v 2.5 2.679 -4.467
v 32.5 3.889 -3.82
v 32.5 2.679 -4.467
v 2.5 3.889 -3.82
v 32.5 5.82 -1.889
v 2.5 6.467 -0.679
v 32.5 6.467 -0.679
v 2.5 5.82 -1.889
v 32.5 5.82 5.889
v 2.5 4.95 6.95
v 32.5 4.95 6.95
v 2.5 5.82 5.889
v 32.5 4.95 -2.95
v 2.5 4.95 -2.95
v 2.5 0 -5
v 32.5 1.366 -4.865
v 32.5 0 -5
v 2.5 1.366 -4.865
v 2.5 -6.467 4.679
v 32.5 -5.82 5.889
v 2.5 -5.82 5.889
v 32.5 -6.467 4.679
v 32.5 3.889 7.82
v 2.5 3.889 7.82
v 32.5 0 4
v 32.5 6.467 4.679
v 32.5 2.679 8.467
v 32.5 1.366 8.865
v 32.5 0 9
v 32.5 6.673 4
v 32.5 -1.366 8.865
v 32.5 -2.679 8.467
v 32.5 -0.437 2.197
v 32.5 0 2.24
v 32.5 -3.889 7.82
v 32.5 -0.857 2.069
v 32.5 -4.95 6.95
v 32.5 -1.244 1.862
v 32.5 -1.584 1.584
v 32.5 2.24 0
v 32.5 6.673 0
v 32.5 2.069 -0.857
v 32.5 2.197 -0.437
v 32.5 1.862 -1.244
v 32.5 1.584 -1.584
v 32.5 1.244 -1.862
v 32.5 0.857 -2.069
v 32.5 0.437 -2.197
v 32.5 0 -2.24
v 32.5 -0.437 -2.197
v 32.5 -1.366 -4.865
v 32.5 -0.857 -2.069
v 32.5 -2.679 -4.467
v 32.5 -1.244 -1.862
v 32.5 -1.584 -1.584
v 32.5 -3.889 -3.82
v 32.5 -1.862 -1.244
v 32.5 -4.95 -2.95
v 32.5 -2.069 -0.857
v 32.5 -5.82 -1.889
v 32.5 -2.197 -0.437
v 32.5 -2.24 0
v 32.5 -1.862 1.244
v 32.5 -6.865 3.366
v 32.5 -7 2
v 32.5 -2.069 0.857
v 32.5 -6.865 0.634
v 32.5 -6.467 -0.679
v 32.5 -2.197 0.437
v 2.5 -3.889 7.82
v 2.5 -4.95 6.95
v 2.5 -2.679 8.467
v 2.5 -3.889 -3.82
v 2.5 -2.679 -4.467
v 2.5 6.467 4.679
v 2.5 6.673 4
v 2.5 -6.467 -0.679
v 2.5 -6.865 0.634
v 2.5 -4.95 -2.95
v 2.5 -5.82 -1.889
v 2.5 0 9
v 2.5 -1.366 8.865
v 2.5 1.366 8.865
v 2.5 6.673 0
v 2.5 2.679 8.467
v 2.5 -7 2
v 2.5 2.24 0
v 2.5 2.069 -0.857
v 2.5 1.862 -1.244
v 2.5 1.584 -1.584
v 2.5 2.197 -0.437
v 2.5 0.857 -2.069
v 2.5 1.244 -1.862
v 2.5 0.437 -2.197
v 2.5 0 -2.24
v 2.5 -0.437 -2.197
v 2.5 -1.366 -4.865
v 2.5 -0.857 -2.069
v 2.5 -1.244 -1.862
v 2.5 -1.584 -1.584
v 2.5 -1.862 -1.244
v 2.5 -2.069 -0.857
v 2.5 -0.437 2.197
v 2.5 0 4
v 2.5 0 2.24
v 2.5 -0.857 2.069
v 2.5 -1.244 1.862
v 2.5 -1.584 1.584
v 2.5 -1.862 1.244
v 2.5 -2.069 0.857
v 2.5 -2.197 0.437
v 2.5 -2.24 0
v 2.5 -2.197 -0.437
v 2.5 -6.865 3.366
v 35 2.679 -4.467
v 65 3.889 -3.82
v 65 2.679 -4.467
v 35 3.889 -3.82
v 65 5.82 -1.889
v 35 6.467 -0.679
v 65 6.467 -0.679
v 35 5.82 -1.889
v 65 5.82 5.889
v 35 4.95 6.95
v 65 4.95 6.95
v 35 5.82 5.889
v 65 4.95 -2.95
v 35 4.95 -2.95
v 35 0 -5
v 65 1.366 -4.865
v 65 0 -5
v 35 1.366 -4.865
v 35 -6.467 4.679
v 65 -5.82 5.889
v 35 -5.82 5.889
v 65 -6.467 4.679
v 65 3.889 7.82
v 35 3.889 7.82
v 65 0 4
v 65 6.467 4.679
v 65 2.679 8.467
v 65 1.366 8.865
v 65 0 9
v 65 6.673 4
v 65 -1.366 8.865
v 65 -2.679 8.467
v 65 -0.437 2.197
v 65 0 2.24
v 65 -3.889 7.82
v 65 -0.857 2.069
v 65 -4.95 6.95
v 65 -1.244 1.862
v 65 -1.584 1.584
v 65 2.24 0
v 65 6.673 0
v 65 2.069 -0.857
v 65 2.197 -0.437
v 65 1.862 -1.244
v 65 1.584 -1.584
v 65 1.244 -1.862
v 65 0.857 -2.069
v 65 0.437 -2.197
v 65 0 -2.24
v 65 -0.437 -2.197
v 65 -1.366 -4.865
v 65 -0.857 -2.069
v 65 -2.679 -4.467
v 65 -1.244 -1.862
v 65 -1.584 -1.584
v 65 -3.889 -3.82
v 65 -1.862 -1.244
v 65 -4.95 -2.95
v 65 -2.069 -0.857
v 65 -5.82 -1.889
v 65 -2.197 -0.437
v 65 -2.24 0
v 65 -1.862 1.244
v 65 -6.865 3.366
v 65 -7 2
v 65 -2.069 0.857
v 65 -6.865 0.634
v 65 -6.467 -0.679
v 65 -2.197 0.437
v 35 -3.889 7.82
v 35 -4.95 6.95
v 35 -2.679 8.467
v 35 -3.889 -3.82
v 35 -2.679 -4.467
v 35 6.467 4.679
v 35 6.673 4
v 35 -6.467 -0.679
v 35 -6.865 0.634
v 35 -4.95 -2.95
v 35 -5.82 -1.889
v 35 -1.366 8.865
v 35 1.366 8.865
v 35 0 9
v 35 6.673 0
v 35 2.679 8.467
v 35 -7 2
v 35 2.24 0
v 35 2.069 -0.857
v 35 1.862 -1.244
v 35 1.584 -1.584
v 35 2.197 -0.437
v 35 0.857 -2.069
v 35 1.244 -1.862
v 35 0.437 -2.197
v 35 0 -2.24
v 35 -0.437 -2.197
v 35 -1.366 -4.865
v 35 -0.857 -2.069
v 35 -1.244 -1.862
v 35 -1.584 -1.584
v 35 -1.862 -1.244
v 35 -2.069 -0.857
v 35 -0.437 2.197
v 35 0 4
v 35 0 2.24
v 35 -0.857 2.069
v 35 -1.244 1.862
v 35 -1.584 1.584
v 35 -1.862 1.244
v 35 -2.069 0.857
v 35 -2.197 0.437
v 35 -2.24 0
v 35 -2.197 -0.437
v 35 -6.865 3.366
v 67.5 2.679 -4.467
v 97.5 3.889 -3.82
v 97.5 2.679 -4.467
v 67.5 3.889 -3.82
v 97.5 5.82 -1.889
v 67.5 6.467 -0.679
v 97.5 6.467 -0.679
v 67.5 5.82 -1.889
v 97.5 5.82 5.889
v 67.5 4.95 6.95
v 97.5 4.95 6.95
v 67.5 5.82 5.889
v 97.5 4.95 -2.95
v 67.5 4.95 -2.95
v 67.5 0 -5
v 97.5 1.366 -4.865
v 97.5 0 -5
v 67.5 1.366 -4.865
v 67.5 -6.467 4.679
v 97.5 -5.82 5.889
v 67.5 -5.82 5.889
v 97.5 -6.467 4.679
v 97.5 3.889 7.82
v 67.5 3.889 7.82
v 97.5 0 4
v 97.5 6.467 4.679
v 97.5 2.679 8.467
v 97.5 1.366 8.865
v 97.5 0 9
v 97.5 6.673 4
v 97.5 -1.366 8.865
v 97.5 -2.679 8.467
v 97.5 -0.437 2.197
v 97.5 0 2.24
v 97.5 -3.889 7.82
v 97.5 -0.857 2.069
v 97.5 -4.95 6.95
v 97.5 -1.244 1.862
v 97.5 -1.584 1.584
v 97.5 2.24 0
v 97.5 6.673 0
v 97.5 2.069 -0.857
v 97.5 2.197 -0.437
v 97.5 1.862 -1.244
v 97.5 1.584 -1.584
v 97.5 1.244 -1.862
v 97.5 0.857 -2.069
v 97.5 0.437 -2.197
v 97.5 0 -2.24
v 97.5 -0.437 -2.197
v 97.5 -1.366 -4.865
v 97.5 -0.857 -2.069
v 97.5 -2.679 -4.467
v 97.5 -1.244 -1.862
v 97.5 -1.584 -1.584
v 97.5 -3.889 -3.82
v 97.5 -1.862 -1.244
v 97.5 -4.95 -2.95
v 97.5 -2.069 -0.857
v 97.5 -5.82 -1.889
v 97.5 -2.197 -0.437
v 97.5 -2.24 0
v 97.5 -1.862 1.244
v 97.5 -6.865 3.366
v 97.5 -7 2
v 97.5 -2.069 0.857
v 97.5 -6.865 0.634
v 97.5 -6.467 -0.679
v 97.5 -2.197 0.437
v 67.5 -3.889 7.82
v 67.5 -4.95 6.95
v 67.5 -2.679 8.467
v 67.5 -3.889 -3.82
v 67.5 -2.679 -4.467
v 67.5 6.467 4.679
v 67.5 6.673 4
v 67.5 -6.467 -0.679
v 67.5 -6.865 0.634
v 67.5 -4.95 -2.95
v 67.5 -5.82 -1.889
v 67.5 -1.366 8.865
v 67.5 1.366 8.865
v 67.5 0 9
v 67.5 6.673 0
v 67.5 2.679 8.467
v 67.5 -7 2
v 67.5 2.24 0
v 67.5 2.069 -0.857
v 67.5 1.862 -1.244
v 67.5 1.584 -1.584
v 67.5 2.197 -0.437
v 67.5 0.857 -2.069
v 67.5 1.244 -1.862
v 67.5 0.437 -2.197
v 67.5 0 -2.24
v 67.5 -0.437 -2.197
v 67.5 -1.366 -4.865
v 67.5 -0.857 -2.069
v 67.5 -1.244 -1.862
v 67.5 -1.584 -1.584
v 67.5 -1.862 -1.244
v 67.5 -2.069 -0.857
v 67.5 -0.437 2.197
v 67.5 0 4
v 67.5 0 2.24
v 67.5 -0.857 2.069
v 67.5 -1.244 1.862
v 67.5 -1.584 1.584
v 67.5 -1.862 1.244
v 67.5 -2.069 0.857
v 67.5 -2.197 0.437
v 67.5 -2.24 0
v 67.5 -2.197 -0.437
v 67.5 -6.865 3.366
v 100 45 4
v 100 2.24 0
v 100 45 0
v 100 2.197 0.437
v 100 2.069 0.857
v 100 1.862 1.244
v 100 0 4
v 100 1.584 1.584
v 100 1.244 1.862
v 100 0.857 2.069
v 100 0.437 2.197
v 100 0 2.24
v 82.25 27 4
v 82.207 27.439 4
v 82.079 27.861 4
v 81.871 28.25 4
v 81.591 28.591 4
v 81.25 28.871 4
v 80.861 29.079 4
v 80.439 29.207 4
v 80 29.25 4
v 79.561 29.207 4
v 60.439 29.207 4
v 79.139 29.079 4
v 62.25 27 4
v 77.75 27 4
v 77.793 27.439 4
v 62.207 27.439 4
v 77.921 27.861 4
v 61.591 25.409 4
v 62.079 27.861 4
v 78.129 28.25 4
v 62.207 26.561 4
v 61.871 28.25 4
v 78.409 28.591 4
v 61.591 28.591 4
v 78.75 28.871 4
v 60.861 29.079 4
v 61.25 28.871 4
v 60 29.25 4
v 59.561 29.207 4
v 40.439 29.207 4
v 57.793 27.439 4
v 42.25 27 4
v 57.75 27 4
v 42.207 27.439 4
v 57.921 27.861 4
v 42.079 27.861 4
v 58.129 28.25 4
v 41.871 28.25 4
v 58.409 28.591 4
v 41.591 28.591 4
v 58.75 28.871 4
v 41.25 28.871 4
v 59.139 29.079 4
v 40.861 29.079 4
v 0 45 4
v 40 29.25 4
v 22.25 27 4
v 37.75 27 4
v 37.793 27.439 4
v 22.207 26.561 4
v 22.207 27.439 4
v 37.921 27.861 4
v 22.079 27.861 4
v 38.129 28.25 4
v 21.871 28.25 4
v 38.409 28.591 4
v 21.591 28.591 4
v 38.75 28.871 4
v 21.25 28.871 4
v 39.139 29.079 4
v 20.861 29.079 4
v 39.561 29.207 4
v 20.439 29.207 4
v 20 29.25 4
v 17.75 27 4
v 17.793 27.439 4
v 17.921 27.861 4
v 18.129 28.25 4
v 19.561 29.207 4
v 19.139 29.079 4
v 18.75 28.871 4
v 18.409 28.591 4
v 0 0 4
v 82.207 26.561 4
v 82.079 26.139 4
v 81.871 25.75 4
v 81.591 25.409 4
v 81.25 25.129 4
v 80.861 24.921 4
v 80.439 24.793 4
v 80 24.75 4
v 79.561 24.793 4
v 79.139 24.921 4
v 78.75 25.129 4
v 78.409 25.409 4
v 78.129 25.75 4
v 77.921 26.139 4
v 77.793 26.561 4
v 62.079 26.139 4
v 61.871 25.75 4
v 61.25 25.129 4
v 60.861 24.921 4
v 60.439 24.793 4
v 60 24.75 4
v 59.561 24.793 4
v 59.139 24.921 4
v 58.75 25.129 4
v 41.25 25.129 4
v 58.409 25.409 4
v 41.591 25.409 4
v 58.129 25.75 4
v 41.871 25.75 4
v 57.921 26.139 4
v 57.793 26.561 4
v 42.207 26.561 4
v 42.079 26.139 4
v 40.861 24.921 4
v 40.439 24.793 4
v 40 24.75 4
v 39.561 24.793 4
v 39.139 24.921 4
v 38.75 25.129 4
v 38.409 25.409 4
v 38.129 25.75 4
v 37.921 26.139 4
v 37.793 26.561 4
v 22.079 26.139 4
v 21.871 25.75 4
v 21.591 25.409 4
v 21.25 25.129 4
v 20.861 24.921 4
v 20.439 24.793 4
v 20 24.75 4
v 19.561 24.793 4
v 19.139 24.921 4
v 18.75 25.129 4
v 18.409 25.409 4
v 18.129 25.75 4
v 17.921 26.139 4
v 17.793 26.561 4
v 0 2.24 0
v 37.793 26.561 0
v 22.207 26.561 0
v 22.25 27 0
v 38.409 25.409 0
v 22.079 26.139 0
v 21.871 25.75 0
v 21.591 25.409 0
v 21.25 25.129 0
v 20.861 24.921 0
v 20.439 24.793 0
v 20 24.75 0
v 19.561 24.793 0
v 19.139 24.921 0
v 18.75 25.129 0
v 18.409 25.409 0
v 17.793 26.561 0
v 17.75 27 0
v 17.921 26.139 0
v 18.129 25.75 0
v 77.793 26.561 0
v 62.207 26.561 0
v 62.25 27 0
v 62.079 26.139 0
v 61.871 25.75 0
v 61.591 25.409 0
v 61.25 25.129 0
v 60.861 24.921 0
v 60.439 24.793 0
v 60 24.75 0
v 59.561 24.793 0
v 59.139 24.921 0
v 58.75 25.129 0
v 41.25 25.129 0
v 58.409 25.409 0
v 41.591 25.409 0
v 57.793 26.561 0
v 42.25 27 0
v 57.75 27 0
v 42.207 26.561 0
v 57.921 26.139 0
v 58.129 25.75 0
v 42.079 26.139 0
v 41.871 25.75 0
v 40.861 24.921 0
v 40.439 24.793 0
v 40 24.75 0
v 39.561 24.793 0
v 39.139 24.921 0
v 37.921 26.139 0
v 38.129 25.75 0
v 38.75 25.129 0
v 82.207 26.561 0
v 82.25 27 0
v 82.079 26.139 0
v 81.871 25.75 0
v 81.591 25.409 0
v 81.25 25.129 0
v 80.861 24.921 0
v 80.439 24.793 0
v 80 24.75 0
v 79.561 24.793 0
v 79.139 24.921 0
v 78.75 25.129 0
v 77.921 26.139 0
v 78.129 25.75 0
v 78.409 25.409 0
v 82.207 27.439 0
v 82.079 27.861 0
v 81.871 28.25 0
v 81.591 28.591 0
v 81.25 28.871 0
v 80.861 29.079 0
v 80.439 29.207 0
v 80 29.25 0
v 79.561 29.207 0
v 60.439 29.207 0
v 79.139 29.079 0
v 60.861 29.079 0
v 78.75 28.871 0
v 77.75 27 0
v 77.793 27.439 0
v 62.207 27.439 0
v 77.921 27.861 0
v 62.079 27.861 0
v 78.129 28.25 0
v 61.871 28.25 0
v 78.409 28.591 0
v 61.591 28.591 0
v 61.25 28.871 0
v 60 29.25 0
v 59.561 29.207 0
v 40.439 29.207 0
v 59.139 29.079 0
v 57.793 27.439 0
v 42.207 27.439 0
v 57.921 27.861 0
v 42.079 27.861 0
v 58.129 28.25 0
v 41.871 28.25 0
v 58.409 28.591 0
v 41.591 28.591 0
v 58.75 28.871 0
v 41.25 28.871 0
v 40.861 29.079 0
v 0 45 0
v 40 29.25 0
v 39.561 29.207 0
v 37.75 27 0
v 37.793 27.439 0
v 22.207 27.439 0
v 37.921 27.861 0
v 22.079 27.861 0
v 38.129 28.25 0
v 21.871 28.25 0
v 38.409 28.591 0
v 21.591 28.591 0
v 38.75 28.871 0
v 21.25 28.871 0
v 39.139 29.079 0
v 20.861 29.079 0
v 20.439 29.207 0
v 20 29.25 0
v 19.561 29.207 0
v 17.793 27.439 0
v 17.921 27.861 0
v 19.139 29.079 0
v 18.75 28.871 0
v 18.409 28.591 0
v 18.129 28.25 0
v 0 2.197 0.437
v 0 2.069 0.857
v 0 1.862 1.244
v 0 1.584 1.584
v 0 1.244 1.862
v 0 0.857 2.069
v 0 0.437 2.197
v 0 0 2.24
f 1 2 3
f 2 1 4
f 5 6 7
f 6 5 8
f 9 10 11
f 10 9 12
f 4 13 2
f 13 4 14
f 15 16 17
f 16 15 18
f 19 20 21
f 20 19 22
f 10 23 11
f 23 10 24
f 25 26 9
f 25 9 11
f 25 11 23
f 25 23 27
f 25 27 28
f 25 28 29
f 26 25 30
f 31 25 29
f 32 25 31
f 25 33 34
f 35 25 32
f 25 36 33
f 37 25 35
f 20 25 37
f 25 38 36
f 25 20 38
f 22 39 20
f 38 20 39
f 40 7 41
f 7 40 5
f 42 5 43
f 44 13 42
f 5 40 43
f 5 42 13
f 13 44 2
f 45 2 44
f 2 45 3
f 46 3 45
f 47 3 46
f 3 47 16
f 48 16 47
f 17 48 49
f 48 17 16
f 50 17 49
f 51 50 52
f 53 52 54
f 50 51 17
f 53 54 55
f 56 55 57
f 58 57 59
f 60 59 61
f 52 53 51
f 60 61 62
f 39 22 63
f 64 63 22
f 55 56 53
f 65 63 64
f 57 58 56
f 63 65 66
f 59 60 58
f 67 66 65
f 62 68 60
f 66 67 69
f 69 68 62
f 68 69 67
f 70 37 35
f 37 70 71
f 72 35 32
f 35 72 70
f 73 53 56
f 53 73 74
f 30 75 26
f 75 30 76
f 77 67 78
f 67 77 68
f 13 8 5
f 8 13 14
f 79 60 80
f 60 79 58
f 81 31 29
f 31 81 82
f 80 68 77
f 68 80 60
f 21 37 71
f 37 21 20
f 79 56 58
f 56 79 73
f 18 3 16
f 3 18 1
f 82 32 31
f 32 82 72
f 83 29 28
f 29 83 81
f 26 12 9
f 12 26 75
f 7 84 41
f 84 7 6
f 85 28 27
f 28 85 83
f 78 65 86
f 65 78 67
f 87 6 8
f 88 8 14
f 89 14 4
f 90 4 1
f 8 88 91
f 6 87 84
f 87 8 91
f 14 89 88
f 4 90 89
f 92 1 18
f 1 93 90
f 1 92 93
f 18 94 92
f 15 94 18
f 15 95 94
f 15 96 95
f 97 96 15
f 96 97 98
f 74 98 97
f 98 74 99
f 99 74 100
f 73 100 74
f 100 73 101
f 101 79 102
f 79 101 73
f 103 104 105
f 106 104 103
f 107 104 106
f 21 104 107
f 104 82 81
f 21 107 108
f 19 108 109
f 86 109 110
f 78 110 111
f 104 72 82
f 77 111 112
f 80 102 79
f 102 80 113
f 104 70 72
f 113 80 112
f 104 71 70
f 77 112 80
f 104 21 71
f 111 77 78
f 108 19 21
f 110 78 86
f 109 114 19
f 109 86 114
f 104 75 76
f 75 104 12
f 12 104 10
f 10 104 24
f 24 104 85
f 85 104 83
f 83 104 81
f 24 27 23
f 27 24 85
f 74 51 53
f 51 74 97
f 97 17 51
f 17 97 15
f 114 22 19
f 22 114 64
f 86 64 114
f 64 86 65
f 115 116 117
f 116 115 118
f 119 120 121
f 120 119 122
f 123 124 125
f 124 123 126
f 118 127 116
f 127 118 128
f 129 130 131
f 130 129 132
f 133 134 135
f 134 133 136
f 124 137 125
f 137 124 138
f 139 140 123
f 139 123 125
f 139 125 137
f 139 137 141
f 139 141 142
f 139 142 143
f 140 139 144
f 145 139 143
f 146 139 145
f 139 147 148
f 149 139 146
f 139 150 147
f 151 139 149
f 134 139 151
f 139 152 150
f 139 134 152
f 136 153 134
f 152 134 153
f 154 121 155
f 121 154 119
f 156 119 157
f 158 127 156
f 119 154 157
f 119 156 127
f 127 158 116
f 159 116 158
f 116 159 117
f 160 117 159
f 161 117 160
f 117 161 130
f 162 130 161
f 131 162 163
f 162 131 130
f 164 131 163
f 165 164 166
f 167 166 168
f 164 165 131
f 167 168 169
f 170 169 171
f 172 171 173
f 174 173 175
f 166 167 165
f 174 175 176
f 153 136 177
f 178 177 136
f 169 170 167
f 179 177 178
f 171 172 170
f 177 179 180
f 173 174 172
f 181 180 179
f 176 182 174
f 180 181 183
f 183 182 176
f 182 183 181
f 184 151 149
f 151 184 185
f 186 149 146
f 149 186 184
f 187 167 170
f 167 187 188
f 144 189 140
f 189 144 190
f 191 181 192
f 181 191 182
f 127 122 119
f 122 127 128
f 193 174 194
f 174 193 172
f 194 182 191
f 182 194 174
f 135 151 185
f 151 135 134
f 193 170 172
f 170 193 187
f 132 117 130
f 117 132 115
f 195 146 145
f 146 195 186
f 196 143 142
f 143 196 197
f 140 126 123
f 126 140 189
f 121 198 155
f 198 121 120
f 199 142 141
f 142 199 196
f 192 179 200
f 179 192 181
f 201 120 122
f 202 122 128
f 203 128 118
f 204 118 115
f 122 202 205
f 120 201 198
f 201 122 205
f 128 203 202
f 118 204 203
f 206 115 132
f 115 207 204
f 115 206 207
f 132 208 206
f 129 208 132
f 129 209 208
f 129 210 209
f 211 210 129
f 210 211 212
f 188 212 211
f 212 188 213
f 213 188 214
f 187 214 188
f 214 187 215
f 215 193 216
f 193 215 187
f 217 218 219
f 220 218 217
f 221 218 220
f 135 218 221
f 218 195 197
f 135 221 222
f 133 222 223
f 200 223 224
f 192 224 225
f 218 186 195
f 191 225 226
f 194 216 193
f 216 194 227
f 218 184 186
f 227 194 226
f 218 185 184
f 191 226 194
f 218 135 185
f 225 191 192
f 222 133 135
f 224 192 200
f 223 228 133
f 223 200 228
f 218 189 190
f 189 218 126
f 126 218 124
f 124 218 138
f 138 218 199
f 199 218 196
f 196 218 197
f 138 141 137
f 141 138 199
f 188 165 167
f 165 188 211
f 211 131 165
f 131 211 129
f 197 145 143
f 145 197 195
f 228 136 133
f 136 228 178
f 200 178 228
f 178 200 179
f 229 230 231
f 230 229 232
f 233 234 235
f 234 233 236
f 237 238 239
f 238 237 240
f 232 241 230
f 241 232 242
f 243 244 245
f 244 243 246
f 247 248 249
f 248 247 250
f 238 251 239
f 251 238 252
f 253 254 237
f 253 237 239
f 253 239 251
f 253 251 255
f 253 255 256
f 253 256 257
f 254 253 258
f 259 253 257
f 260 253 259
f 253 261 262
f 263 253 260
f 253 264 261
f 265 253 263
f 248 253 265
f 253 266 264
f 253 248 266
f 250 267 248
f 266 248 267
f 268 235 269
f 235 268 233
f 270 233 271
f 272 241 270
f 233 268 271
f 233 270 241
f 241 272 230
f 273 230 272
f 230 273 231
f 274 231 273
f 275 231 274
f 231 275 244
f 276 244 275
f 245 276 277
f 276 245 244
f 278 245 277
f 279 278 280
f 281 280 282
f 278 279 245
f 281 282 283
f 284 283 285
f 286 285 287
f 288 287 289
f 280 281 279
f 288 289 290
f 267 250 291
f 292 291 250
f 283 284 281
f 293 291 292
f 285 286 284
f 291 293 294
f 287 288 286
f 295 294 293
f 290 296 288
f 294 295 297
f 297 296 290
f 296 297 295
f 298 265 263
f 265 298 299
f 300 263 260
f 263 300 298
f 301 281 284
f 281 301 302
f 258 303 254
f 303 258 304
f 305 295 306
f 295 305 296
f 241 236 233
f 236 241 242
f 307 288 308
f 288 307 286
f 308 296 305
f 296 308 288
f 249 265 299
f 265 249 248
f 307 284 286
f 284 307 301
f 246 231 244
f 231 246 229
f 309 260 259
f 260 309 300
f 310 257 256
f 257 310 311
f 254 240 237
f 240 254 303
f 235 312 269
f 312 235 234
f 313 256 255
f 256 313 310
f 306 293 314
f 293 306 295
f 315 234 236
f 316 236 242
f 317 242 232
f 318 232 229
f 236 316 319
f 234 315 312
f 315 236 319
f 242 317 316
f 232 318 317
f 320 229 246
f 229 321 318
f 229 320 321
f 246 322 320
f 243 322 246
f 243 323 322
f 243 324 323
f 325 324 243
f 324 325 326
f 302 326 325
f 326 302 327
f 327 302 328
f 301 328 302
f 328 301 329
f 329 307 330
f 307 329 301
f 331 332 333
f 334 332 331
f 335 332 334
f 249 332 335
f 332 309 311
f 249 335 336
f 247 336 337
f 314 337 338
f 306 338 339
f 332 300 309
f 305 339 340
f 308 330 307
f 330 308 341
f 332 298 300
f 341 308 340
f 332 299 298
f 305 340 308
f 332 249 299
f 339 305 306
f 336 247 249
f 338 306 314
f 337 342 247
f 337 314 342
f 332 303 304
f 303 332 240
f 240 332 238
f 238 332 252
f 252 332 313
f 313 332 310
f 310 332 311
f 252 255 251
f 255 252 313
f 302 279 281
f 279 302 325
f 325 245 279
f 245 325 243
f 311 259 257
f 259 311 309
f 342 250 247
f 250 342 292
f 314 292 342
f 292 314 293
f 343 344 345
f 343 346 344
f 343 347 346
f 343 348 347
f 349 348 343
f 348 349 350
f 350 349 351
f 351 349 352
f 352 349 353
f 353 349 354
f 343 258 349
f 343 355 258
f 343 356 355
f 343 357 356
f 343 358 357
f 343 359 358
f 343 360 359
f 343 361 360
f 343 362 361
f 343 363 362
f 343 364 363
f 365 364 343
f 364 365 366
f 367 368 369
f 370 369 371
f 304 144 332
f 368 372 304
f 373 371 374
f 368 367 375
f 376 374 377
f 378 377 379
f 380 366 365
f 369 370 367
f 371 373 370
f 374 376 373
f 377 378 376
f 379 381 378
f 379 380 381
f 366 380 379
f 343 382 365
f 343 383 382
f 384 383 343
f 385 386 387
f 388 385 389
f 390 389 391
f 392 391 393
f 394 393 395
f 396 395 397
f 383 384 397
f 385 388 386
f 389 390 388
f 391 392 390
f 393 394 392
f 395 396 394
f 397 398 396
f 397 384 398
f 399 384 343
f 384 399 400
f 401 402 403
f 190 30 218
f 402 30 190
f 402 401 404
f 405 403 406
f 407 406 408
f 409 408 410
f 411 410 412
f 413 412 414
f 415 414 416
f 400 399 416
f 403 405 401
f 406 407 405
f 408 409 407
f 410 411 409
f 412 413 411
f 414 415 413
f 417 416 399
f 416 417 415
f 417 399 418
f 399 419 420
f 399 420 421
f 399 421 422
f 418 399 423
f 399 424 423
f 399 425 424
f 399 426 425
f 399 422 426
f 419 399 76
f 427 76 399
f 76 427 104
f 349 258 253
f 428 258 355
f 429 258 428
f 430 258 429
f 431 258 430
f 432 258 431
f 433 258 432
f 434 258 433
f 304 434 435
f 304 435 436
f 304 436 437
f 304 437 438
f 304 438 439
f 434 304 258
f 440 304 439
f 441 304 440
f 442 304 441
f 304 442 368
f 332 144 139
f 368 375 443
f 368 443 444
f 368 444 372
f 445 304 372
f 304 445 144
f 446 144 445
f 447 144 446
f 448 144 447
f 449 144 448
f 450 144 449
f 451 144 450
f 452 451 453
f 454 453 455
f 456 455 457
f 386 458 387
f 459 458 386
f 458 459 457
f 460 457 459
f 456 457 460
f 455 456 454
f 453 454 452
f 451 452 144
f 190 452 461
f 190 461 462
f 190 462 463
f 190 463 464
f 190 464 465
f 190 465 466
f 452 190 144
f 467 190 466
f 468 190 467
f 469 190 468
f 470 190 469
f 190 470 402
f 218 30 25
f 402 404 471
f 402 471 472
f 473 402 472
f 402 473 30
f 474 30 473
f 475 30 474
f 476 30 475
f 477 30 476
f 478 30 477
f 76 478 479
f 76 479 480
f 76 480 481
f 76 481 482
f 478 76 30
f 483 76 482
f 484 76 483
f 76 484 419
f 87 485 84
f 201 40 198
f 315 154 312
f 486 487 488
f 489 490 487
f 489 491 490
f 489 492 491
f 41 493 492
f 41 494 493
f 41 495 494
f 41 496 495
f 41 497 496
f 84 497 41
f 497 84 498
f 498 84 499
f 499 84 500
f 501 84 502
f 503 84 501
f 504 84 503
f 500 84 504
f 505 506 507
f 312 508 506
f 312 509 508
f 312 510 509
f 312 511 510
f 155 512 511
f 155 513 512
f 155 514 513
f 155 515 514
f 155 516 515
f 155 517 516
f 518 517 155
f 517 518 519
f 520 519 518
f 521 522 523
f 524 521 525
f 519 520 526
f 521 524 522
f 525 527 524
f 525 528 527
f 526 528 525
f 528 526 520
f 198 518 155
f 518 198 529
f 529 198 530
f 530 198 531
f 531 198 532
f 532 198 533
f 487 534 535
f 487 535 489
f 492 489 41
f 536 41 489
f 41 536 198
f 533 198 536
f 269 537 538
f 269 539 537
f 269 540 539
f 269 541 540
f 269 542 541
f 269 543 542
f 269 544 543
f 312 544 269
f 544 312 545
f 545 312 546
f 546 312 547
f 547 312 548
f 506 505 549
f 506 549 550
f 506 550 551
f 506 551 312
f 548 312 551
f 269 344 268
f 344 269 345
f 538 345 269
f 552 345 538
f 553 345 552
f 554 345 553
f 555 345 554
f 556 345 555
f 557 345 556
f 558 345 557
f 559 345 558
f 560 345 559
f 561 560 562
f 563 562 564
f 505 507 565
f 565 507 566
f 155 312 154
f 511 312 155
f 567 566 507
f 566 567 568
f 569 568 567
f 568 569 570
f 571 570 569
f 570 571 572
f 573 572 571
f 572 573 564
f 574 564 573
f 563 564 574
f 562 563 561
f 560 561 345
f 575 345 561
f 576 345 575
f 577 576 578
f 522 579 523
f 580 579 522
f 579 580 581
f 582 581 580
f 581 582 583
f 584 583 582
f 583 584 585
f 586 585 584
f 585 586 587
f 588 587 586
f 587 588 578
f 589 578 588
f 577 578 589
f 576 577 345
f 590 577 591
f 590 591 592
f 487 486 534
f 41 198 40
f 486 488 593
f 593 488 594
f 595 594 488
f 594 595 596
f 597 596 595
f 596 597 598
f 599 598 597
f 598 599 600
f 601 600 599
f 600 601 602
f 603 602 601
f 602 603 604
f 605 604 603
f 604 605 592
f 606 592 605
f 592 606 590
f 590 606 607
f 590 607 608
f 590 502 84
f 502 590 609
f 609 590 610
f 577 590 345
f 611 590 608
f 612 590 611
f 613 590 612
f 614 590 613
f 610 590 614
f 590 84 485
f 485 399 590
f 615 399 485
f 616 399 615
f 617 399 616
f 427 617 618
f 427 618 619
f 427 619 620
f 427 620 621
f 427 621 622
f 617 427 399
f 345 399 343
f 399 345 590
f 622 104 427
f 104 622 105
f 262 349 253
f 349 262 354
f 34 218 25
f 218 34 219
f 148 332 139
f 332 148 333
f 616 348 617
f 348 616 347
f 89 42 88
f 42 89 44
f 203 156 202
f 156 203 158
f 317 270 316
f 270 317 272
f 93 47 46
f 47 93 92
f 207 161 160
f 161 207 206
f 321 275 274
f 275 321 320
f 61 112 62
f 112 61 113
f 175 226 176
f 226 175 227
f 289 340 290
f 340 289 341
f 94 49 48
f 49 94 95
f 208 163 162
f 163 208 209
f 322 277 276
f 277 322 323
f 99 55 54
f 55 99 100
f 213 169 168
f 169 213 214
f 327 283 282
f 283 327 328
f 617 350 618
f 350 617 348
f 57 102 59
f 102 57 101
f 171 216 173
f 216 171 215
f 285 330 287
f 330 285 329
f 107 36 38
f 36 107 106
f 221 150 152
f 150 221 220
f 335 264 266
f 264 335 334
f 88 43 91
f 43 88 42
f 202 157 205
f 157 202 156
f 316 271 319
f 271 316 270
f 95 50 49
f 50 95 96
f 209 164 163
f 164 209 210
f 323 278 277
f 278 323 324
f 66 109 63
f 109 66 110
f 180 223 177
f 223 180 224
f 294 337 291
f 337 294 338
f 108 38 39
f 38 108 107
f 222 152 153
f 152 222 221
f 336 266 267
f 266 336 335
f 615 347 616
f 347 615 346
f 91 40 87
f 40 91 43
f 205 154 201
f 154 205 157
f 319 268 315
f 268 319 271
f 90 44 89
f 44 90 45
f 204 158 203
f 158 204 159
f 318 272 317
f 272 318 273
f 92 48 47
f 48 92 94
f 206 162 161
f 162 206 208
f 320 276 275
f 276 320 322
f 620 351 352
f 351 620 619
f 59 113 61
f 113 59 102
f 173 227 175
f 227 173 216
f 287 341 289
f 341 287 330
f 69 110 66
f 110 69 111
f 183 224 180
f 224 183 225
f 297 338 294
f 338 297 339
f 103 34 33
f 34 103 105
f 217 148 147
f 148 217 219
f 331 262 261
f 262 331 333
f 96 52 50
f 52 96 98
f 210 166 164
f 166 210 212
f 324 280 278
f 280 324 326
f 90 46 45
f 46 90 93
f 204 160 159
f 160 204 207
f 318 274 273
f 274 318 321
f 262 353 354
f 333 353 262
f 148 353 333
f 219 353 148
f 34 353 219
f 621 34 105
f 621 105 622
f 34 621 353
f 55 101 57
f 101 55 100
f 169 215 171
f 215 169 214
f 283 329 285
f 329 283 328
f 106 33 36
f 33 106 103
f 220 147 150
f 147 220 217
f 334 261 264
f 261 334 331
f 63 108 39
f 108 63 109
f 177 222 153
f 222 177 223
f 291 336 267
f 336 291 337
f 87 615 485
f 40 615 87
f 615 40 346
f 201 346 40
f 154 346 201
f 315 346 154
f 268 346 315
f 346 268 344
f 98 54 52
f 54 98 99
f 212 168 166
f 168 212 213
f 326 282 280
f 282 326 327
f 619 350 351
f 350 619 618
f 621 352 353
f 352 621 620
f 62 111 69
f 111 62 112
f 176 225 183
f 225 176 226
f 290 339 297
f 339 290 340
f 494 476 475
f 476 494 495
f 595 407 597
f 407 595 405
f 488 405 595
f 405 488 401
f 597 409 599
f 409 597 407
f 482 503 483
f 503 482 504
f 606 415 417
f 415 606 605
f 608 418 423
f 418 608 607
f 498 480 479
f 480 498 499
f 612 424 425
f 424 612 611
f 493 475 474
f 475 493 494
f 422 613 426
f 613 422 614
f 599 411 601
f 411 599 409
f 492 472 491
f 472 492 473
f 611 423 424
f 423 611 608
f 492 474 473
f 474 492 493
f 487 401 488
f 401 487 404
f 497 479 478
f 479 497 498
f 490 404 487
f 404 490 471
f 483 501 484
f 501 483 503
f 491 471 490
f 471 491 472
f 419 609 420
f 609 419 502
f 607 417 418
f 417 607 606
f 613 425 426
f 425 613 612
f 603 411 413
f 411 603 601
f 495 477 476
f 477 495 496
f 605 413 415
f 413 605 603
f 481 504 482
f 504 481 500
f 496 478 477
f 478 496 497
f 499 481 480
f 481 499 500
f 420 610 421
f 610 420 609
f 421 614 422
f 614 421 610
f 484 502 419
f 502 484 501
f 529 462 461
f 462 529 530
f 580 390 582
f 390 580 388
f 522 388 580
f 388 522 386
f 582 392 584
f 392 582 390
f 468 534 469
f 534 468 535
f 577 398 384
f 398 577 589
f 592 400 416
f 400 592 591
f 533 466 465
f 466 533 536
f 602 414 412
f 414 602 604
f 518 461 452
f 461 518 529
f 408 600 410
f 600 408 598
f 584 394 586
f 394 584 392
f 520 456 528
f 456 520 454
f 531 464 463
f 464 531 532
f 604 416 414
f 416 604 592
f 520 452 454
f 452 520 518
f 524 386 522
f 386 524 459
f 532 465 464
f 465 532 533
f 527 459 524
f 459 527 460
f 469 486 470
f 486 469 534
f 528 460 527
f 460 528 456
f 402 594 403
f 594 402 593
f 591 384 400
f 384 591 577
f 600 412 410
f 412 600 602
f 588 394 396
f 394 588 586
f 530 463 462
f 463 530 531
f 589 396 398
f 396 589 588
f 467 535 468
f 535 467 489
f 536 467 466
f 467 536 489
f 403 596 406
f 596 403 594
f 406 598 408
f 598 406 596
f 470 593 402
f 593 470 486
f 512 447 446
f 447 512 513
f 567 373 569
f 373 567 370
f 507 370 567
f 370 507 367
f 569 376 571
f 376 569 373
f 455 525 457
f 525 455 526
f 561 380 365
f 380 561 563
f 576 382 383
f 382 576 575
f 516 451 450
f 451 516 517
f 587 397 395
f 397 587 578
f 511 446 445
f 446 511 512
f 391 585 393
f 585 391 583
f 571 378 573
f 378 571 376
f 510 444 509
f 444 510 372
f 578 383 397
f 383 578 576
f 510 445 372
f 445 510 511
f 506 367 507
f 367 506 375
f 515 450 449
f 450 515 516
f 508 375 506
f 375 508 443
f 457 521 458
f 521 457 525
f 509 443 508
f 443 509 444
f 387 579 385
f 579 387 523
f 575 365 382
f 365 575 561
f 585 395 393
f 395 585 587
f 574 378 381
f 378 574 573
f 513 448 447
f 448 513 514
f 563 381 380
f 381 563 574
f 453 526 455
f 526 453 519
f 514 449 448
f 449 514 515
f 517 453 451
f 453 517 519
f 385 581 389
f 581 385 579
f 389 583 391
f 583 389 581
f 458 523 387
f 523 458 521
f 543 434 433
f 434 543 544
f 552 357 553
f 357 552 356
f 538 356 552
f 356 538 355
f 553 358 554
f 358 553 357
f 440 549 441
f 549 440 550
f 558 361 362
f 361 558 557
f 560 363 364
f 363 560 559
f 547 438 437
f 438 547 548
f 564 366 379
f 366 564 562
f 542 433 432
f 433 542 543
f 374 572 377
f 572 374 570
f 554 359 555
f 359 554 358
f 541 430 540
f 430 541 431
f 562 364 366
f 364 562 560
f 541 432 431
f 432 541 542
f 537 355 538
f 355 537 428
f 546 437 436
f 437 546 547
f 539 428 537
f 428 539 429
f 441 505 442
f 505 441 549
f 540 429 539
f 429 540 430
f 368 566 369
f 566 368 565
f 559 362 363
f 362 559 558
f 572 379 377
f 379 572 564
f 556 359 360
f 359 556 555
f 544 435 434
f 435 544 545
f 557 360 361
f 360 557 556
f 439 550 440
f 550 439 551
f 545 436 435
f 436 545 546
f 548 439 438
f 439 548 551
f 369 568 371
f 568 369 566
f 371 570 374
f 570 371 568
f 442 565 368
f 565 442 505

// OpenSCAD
$fn = 32;

// ----------------------------------------------------------------------
// Hinge leaf: 100 x 52 x 14 mm
// ----------------------------------------------------------------------

// --- parameters (mm) ---
leaf_len = 100;           // leaf length, X
leaf_w = 45;              // leaf width, Y
leaf_t = 4;               // leaf thickness
knuckle_d = 14;           // knuckle diameter
knuckle_w = 30;           // knuckle width
knuckle_n = 3;            // number of knuckles
pin_d = 4.48;             // pin bore
gap = 2.5;                // gap between the knuckles
screw_d = 4.5;            // screw clearance

module leaf() {
  cube([leaf_len, leaf_w, leaf_t]);
}

module knuckles() {
  /* barrels sit on the leaf edge, the pin axis at half the leaf thickness */
  for (i = [0 : knuckle_n - 1])
    translate([gap + i * (knuckle_w + gap), 0, leaf_t * 0.5])
      rotate([0, 90, 0]) cylinder(h = knuckle_w, d = knuckle_d);
}

difference() {
  union() {
    leaf();
    knuckles();
  }
  rotate([0, 90, 0]) translate([0, 0, -1])
    cylinder(h = leaf_len + 2, d = pin_d);
  translate([20, leaf_w * 0.6, -1]) cylinder(h = leaf_t + 2, d = screw_d);
  translate([40, leaf_w * 0.6, -1]) cylinder(h = leaf_t + 2, d = screw_d);
  translate([60, leaf_w * 0.6, -1]) cylinder(h = leaf_t + 2, d = screw_d);
  translate([80, leaf_w * 0.6, -1]) cylinder(h = leaf_t + 2, d = screw_d);
}
